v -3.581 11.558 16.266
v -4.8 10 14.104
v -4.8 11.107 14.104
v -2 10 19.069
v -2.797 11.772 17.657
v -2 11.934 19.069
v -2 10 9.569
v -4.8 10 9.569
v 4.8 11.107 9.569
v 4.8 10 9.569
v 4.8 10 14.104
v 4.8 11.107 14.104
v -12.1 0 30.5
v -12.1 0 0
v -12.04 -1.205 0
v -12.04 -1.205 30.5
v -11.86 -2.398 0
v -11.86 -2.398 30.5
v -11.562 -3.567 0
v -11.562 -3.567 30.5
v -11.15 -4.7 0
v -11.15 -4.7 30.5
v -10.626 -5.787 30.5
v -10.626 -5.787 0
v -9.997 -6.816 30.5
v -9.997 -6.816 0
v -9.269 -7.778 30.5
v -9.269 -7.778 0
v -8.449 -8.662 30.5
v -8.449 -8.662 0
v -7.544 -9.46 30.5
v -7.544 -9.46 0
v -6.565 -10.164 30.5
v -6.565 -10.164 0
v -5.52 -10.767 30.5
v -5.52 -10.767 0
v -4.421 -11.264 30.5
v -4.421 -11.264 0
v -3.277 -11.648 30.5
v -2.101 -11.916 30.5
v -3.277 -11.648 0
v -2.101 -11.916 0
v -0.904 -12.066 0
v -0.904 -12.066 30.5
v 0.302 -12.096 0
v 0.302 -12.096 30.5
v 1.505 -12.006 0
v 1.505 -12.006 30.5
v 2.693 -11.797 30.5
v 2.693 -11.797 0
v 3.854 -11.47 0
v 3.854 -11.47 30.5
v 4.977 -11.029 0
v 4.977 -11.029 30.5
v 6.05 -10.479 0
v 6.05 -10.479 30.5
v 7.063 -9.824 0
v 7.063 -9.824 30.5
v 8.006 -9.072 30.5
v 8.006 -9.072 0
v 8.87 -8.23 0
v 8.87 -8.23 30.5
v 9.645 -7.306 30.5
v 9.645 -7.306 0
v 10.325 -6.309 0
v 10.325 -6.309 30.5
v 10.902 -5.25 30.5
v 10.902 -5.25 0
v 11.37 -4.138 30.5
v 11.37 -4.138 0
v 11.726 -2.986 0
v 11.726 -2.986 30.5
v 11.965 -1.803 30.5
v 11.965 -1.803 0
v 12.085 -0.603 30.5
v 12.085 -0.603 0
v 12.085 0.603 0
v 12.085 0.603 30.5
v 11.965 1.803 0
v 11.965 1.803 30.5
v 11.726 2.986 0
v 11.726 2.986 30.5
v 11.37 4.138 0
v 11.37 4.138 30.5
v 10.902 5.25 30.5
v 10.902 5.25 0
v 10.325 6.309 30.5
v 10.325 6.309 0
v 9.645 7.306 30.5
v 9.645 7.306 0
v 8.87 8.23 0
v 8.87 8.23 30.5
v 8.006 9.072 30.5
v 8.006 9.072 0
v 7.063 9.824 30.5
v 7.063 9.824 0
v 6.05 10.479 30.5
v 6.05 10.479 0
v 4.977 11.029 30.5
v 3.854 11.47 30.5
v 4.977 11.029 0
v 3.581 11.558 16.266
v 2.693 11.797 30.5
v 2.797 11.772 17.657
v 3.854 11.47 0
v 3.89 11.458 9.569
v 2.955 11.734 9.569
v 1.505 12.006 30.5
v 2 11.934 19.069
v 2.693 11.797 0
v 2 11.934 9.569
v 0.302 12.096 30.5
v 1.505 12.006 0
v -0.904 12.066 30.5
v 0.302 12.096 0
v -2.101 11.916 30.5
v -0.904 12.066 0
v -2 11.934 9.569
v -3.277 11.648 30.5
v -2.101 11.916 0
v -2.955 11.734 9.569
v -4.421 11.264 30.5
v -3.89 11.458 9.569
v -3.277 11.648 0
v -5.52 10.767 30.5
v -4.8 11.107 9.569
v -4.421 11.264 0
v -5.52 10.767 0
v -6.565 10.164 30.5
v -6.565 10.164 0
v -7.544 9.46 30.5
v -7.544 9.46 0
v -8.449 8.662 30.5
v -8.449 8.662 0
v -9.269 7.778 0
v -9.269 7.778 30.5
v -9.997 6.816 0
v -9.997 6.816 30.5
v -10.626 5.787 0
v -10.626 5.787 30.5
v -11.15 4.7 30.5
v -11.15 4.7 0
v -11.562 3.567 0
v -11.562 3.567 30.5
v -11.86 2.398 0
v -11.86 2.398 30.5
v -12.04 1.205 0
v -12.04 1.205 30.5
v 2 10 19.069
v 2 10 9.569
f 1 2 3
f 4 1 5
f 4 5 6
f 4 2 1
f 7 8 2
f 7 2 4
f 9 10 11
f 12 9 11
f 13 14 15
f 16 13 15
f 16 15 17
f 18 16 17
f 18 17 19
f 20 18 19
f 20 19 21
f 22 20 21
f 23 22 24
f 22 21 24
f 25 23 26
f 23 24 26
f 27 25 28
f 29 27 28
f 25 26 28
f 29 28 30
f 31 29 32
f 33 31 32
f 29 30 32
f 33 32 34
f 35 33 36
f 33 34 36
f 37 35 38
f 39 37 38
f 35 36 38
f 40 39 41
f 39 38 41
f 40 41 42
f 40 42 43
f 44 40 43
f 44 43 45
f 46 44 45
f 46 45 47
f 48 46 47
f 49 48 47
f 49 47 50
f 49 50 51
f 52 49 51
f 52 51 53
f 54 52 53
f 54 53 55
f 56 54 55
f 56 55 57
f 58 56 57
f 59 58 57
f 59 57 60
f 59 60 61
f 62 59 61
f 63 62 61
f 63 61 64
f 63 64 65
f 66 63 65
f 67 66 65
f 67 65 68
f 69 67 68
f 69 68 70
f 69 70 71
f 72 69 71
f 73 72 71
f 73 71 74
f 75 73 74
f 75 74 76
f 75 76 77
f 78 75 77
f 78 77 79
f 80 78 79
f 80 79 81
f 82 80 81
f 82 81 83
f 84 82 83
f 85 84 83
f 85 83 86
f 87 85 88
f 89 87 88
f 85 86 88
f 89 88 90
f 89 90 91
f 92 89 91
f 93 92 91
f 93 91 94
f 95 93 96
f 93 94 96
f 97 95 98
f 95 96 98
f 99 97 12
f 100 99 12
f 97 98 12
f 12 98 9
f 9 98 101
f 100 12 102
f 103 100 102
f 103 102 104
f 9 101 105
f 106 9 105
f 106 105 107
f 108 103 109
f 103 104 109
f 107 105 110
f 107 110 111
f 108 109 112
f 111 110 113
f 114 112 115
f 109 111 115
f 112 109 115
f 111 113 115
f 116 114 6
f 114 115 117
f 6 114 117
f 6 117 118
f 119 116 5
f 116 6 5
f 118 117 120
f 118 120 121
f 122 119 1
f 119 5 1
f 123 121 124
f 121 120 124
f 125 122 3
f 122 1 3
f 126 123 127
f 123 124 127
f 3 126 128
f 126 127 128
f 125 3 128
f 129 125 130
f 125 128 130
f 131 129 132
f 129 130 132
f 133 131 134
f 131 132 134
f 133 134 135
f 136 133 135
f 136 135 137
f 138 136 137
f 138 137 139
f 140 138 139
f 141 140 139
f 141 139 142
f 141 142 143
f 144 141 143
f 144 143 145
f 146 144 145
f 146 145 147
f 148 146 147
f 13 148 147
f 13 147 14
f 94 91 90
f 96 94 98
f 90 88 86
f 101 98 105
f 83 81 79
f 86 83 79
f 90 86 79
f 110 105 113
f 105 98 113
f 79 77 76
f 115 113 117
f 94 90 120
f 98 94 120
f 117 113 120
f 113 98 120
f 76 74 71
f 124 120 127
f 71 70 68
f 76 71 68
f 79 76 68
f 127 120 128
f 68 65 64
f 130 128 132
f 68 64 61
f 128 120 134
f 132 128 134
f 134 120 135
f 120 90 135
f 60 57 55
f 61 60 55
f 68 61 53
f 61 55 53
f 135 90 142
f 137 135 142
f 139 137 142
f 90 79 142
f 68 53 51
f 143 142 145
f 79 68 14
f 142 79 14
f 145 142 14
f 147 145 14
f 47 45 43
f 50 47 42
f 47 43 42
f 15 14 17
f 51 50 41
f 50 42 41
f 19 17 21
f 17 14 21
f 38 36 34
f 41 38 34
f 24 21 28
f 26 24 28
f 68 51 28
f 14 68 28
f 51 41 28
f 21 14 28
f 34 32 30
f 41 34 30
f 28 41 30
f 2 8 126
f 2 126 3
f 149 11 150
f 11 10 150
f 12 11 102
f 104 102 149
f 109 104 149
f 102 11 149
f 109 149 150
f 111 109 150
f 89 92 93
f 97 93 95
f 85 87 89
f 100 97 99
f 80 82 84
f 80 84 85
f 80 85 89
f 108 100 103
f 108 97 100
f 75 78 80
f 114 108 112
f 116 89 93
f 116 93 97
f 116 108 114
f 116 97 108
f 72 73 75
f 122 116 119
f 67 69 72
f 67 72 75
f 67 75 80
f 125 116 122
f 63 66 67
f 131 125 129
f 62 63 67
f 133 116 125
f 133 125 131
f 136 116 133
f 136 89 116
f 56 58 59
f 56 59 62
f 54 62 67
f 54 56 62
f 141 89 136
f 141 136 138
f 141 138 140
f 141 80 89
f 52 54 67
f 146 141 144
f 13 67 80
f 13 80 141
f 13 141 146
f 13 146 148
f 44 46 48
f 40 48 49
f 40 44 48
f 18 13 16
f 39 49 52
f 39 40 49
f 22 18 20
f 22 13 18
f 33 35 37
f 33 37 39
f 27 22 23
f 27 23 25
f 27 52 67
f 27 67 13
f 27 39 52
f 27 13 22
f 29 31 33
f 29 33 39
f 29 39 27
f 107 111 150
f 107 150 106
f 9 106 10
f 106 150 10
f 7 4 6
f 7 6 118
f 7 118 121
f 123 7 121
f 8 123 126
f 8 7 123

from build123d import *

# Parameters (mm, degrees)
SKETCH1_R           = 12.1
BOSS_EXTRUDE1_DEPTH = 30.5
CUT_EXTRUDE1_DEPTH  = 40.56096561


with BuildPart() as part:
    # Sketch1 → Boss-Extrude1 (new body)
    with BuildSketch(Plane.XY):
        with Locations(Location((0, 0, 0), (0, 0, 180))):
            Circle(SKETCH1_R)
    extrude(amount=BOSS_EXTRUDE1_DEPTH)

    # Sketch2 → Cut-Extrude1 (cut, through all)
    with BuildSketch(Plane(origin=(0, 10, 0), x_dir=(1, 0, 0), z_dir=(0, 1, 0))):
        Polygon((-2, -9.569188556), (-4.8, -9.569188556), (-4.8, -14.104311921), (-2, -19.069188556), align=None)
        Polygon((4.8, -14.104311921), (2, -19.069188556), (2, -9.569188556), (4.8, -9.569188556), align=None)
    extrude(amount=CUT_EXTRUDE1_DEPTH, mode=Mode.SUBTRACT)


solid = part.part
